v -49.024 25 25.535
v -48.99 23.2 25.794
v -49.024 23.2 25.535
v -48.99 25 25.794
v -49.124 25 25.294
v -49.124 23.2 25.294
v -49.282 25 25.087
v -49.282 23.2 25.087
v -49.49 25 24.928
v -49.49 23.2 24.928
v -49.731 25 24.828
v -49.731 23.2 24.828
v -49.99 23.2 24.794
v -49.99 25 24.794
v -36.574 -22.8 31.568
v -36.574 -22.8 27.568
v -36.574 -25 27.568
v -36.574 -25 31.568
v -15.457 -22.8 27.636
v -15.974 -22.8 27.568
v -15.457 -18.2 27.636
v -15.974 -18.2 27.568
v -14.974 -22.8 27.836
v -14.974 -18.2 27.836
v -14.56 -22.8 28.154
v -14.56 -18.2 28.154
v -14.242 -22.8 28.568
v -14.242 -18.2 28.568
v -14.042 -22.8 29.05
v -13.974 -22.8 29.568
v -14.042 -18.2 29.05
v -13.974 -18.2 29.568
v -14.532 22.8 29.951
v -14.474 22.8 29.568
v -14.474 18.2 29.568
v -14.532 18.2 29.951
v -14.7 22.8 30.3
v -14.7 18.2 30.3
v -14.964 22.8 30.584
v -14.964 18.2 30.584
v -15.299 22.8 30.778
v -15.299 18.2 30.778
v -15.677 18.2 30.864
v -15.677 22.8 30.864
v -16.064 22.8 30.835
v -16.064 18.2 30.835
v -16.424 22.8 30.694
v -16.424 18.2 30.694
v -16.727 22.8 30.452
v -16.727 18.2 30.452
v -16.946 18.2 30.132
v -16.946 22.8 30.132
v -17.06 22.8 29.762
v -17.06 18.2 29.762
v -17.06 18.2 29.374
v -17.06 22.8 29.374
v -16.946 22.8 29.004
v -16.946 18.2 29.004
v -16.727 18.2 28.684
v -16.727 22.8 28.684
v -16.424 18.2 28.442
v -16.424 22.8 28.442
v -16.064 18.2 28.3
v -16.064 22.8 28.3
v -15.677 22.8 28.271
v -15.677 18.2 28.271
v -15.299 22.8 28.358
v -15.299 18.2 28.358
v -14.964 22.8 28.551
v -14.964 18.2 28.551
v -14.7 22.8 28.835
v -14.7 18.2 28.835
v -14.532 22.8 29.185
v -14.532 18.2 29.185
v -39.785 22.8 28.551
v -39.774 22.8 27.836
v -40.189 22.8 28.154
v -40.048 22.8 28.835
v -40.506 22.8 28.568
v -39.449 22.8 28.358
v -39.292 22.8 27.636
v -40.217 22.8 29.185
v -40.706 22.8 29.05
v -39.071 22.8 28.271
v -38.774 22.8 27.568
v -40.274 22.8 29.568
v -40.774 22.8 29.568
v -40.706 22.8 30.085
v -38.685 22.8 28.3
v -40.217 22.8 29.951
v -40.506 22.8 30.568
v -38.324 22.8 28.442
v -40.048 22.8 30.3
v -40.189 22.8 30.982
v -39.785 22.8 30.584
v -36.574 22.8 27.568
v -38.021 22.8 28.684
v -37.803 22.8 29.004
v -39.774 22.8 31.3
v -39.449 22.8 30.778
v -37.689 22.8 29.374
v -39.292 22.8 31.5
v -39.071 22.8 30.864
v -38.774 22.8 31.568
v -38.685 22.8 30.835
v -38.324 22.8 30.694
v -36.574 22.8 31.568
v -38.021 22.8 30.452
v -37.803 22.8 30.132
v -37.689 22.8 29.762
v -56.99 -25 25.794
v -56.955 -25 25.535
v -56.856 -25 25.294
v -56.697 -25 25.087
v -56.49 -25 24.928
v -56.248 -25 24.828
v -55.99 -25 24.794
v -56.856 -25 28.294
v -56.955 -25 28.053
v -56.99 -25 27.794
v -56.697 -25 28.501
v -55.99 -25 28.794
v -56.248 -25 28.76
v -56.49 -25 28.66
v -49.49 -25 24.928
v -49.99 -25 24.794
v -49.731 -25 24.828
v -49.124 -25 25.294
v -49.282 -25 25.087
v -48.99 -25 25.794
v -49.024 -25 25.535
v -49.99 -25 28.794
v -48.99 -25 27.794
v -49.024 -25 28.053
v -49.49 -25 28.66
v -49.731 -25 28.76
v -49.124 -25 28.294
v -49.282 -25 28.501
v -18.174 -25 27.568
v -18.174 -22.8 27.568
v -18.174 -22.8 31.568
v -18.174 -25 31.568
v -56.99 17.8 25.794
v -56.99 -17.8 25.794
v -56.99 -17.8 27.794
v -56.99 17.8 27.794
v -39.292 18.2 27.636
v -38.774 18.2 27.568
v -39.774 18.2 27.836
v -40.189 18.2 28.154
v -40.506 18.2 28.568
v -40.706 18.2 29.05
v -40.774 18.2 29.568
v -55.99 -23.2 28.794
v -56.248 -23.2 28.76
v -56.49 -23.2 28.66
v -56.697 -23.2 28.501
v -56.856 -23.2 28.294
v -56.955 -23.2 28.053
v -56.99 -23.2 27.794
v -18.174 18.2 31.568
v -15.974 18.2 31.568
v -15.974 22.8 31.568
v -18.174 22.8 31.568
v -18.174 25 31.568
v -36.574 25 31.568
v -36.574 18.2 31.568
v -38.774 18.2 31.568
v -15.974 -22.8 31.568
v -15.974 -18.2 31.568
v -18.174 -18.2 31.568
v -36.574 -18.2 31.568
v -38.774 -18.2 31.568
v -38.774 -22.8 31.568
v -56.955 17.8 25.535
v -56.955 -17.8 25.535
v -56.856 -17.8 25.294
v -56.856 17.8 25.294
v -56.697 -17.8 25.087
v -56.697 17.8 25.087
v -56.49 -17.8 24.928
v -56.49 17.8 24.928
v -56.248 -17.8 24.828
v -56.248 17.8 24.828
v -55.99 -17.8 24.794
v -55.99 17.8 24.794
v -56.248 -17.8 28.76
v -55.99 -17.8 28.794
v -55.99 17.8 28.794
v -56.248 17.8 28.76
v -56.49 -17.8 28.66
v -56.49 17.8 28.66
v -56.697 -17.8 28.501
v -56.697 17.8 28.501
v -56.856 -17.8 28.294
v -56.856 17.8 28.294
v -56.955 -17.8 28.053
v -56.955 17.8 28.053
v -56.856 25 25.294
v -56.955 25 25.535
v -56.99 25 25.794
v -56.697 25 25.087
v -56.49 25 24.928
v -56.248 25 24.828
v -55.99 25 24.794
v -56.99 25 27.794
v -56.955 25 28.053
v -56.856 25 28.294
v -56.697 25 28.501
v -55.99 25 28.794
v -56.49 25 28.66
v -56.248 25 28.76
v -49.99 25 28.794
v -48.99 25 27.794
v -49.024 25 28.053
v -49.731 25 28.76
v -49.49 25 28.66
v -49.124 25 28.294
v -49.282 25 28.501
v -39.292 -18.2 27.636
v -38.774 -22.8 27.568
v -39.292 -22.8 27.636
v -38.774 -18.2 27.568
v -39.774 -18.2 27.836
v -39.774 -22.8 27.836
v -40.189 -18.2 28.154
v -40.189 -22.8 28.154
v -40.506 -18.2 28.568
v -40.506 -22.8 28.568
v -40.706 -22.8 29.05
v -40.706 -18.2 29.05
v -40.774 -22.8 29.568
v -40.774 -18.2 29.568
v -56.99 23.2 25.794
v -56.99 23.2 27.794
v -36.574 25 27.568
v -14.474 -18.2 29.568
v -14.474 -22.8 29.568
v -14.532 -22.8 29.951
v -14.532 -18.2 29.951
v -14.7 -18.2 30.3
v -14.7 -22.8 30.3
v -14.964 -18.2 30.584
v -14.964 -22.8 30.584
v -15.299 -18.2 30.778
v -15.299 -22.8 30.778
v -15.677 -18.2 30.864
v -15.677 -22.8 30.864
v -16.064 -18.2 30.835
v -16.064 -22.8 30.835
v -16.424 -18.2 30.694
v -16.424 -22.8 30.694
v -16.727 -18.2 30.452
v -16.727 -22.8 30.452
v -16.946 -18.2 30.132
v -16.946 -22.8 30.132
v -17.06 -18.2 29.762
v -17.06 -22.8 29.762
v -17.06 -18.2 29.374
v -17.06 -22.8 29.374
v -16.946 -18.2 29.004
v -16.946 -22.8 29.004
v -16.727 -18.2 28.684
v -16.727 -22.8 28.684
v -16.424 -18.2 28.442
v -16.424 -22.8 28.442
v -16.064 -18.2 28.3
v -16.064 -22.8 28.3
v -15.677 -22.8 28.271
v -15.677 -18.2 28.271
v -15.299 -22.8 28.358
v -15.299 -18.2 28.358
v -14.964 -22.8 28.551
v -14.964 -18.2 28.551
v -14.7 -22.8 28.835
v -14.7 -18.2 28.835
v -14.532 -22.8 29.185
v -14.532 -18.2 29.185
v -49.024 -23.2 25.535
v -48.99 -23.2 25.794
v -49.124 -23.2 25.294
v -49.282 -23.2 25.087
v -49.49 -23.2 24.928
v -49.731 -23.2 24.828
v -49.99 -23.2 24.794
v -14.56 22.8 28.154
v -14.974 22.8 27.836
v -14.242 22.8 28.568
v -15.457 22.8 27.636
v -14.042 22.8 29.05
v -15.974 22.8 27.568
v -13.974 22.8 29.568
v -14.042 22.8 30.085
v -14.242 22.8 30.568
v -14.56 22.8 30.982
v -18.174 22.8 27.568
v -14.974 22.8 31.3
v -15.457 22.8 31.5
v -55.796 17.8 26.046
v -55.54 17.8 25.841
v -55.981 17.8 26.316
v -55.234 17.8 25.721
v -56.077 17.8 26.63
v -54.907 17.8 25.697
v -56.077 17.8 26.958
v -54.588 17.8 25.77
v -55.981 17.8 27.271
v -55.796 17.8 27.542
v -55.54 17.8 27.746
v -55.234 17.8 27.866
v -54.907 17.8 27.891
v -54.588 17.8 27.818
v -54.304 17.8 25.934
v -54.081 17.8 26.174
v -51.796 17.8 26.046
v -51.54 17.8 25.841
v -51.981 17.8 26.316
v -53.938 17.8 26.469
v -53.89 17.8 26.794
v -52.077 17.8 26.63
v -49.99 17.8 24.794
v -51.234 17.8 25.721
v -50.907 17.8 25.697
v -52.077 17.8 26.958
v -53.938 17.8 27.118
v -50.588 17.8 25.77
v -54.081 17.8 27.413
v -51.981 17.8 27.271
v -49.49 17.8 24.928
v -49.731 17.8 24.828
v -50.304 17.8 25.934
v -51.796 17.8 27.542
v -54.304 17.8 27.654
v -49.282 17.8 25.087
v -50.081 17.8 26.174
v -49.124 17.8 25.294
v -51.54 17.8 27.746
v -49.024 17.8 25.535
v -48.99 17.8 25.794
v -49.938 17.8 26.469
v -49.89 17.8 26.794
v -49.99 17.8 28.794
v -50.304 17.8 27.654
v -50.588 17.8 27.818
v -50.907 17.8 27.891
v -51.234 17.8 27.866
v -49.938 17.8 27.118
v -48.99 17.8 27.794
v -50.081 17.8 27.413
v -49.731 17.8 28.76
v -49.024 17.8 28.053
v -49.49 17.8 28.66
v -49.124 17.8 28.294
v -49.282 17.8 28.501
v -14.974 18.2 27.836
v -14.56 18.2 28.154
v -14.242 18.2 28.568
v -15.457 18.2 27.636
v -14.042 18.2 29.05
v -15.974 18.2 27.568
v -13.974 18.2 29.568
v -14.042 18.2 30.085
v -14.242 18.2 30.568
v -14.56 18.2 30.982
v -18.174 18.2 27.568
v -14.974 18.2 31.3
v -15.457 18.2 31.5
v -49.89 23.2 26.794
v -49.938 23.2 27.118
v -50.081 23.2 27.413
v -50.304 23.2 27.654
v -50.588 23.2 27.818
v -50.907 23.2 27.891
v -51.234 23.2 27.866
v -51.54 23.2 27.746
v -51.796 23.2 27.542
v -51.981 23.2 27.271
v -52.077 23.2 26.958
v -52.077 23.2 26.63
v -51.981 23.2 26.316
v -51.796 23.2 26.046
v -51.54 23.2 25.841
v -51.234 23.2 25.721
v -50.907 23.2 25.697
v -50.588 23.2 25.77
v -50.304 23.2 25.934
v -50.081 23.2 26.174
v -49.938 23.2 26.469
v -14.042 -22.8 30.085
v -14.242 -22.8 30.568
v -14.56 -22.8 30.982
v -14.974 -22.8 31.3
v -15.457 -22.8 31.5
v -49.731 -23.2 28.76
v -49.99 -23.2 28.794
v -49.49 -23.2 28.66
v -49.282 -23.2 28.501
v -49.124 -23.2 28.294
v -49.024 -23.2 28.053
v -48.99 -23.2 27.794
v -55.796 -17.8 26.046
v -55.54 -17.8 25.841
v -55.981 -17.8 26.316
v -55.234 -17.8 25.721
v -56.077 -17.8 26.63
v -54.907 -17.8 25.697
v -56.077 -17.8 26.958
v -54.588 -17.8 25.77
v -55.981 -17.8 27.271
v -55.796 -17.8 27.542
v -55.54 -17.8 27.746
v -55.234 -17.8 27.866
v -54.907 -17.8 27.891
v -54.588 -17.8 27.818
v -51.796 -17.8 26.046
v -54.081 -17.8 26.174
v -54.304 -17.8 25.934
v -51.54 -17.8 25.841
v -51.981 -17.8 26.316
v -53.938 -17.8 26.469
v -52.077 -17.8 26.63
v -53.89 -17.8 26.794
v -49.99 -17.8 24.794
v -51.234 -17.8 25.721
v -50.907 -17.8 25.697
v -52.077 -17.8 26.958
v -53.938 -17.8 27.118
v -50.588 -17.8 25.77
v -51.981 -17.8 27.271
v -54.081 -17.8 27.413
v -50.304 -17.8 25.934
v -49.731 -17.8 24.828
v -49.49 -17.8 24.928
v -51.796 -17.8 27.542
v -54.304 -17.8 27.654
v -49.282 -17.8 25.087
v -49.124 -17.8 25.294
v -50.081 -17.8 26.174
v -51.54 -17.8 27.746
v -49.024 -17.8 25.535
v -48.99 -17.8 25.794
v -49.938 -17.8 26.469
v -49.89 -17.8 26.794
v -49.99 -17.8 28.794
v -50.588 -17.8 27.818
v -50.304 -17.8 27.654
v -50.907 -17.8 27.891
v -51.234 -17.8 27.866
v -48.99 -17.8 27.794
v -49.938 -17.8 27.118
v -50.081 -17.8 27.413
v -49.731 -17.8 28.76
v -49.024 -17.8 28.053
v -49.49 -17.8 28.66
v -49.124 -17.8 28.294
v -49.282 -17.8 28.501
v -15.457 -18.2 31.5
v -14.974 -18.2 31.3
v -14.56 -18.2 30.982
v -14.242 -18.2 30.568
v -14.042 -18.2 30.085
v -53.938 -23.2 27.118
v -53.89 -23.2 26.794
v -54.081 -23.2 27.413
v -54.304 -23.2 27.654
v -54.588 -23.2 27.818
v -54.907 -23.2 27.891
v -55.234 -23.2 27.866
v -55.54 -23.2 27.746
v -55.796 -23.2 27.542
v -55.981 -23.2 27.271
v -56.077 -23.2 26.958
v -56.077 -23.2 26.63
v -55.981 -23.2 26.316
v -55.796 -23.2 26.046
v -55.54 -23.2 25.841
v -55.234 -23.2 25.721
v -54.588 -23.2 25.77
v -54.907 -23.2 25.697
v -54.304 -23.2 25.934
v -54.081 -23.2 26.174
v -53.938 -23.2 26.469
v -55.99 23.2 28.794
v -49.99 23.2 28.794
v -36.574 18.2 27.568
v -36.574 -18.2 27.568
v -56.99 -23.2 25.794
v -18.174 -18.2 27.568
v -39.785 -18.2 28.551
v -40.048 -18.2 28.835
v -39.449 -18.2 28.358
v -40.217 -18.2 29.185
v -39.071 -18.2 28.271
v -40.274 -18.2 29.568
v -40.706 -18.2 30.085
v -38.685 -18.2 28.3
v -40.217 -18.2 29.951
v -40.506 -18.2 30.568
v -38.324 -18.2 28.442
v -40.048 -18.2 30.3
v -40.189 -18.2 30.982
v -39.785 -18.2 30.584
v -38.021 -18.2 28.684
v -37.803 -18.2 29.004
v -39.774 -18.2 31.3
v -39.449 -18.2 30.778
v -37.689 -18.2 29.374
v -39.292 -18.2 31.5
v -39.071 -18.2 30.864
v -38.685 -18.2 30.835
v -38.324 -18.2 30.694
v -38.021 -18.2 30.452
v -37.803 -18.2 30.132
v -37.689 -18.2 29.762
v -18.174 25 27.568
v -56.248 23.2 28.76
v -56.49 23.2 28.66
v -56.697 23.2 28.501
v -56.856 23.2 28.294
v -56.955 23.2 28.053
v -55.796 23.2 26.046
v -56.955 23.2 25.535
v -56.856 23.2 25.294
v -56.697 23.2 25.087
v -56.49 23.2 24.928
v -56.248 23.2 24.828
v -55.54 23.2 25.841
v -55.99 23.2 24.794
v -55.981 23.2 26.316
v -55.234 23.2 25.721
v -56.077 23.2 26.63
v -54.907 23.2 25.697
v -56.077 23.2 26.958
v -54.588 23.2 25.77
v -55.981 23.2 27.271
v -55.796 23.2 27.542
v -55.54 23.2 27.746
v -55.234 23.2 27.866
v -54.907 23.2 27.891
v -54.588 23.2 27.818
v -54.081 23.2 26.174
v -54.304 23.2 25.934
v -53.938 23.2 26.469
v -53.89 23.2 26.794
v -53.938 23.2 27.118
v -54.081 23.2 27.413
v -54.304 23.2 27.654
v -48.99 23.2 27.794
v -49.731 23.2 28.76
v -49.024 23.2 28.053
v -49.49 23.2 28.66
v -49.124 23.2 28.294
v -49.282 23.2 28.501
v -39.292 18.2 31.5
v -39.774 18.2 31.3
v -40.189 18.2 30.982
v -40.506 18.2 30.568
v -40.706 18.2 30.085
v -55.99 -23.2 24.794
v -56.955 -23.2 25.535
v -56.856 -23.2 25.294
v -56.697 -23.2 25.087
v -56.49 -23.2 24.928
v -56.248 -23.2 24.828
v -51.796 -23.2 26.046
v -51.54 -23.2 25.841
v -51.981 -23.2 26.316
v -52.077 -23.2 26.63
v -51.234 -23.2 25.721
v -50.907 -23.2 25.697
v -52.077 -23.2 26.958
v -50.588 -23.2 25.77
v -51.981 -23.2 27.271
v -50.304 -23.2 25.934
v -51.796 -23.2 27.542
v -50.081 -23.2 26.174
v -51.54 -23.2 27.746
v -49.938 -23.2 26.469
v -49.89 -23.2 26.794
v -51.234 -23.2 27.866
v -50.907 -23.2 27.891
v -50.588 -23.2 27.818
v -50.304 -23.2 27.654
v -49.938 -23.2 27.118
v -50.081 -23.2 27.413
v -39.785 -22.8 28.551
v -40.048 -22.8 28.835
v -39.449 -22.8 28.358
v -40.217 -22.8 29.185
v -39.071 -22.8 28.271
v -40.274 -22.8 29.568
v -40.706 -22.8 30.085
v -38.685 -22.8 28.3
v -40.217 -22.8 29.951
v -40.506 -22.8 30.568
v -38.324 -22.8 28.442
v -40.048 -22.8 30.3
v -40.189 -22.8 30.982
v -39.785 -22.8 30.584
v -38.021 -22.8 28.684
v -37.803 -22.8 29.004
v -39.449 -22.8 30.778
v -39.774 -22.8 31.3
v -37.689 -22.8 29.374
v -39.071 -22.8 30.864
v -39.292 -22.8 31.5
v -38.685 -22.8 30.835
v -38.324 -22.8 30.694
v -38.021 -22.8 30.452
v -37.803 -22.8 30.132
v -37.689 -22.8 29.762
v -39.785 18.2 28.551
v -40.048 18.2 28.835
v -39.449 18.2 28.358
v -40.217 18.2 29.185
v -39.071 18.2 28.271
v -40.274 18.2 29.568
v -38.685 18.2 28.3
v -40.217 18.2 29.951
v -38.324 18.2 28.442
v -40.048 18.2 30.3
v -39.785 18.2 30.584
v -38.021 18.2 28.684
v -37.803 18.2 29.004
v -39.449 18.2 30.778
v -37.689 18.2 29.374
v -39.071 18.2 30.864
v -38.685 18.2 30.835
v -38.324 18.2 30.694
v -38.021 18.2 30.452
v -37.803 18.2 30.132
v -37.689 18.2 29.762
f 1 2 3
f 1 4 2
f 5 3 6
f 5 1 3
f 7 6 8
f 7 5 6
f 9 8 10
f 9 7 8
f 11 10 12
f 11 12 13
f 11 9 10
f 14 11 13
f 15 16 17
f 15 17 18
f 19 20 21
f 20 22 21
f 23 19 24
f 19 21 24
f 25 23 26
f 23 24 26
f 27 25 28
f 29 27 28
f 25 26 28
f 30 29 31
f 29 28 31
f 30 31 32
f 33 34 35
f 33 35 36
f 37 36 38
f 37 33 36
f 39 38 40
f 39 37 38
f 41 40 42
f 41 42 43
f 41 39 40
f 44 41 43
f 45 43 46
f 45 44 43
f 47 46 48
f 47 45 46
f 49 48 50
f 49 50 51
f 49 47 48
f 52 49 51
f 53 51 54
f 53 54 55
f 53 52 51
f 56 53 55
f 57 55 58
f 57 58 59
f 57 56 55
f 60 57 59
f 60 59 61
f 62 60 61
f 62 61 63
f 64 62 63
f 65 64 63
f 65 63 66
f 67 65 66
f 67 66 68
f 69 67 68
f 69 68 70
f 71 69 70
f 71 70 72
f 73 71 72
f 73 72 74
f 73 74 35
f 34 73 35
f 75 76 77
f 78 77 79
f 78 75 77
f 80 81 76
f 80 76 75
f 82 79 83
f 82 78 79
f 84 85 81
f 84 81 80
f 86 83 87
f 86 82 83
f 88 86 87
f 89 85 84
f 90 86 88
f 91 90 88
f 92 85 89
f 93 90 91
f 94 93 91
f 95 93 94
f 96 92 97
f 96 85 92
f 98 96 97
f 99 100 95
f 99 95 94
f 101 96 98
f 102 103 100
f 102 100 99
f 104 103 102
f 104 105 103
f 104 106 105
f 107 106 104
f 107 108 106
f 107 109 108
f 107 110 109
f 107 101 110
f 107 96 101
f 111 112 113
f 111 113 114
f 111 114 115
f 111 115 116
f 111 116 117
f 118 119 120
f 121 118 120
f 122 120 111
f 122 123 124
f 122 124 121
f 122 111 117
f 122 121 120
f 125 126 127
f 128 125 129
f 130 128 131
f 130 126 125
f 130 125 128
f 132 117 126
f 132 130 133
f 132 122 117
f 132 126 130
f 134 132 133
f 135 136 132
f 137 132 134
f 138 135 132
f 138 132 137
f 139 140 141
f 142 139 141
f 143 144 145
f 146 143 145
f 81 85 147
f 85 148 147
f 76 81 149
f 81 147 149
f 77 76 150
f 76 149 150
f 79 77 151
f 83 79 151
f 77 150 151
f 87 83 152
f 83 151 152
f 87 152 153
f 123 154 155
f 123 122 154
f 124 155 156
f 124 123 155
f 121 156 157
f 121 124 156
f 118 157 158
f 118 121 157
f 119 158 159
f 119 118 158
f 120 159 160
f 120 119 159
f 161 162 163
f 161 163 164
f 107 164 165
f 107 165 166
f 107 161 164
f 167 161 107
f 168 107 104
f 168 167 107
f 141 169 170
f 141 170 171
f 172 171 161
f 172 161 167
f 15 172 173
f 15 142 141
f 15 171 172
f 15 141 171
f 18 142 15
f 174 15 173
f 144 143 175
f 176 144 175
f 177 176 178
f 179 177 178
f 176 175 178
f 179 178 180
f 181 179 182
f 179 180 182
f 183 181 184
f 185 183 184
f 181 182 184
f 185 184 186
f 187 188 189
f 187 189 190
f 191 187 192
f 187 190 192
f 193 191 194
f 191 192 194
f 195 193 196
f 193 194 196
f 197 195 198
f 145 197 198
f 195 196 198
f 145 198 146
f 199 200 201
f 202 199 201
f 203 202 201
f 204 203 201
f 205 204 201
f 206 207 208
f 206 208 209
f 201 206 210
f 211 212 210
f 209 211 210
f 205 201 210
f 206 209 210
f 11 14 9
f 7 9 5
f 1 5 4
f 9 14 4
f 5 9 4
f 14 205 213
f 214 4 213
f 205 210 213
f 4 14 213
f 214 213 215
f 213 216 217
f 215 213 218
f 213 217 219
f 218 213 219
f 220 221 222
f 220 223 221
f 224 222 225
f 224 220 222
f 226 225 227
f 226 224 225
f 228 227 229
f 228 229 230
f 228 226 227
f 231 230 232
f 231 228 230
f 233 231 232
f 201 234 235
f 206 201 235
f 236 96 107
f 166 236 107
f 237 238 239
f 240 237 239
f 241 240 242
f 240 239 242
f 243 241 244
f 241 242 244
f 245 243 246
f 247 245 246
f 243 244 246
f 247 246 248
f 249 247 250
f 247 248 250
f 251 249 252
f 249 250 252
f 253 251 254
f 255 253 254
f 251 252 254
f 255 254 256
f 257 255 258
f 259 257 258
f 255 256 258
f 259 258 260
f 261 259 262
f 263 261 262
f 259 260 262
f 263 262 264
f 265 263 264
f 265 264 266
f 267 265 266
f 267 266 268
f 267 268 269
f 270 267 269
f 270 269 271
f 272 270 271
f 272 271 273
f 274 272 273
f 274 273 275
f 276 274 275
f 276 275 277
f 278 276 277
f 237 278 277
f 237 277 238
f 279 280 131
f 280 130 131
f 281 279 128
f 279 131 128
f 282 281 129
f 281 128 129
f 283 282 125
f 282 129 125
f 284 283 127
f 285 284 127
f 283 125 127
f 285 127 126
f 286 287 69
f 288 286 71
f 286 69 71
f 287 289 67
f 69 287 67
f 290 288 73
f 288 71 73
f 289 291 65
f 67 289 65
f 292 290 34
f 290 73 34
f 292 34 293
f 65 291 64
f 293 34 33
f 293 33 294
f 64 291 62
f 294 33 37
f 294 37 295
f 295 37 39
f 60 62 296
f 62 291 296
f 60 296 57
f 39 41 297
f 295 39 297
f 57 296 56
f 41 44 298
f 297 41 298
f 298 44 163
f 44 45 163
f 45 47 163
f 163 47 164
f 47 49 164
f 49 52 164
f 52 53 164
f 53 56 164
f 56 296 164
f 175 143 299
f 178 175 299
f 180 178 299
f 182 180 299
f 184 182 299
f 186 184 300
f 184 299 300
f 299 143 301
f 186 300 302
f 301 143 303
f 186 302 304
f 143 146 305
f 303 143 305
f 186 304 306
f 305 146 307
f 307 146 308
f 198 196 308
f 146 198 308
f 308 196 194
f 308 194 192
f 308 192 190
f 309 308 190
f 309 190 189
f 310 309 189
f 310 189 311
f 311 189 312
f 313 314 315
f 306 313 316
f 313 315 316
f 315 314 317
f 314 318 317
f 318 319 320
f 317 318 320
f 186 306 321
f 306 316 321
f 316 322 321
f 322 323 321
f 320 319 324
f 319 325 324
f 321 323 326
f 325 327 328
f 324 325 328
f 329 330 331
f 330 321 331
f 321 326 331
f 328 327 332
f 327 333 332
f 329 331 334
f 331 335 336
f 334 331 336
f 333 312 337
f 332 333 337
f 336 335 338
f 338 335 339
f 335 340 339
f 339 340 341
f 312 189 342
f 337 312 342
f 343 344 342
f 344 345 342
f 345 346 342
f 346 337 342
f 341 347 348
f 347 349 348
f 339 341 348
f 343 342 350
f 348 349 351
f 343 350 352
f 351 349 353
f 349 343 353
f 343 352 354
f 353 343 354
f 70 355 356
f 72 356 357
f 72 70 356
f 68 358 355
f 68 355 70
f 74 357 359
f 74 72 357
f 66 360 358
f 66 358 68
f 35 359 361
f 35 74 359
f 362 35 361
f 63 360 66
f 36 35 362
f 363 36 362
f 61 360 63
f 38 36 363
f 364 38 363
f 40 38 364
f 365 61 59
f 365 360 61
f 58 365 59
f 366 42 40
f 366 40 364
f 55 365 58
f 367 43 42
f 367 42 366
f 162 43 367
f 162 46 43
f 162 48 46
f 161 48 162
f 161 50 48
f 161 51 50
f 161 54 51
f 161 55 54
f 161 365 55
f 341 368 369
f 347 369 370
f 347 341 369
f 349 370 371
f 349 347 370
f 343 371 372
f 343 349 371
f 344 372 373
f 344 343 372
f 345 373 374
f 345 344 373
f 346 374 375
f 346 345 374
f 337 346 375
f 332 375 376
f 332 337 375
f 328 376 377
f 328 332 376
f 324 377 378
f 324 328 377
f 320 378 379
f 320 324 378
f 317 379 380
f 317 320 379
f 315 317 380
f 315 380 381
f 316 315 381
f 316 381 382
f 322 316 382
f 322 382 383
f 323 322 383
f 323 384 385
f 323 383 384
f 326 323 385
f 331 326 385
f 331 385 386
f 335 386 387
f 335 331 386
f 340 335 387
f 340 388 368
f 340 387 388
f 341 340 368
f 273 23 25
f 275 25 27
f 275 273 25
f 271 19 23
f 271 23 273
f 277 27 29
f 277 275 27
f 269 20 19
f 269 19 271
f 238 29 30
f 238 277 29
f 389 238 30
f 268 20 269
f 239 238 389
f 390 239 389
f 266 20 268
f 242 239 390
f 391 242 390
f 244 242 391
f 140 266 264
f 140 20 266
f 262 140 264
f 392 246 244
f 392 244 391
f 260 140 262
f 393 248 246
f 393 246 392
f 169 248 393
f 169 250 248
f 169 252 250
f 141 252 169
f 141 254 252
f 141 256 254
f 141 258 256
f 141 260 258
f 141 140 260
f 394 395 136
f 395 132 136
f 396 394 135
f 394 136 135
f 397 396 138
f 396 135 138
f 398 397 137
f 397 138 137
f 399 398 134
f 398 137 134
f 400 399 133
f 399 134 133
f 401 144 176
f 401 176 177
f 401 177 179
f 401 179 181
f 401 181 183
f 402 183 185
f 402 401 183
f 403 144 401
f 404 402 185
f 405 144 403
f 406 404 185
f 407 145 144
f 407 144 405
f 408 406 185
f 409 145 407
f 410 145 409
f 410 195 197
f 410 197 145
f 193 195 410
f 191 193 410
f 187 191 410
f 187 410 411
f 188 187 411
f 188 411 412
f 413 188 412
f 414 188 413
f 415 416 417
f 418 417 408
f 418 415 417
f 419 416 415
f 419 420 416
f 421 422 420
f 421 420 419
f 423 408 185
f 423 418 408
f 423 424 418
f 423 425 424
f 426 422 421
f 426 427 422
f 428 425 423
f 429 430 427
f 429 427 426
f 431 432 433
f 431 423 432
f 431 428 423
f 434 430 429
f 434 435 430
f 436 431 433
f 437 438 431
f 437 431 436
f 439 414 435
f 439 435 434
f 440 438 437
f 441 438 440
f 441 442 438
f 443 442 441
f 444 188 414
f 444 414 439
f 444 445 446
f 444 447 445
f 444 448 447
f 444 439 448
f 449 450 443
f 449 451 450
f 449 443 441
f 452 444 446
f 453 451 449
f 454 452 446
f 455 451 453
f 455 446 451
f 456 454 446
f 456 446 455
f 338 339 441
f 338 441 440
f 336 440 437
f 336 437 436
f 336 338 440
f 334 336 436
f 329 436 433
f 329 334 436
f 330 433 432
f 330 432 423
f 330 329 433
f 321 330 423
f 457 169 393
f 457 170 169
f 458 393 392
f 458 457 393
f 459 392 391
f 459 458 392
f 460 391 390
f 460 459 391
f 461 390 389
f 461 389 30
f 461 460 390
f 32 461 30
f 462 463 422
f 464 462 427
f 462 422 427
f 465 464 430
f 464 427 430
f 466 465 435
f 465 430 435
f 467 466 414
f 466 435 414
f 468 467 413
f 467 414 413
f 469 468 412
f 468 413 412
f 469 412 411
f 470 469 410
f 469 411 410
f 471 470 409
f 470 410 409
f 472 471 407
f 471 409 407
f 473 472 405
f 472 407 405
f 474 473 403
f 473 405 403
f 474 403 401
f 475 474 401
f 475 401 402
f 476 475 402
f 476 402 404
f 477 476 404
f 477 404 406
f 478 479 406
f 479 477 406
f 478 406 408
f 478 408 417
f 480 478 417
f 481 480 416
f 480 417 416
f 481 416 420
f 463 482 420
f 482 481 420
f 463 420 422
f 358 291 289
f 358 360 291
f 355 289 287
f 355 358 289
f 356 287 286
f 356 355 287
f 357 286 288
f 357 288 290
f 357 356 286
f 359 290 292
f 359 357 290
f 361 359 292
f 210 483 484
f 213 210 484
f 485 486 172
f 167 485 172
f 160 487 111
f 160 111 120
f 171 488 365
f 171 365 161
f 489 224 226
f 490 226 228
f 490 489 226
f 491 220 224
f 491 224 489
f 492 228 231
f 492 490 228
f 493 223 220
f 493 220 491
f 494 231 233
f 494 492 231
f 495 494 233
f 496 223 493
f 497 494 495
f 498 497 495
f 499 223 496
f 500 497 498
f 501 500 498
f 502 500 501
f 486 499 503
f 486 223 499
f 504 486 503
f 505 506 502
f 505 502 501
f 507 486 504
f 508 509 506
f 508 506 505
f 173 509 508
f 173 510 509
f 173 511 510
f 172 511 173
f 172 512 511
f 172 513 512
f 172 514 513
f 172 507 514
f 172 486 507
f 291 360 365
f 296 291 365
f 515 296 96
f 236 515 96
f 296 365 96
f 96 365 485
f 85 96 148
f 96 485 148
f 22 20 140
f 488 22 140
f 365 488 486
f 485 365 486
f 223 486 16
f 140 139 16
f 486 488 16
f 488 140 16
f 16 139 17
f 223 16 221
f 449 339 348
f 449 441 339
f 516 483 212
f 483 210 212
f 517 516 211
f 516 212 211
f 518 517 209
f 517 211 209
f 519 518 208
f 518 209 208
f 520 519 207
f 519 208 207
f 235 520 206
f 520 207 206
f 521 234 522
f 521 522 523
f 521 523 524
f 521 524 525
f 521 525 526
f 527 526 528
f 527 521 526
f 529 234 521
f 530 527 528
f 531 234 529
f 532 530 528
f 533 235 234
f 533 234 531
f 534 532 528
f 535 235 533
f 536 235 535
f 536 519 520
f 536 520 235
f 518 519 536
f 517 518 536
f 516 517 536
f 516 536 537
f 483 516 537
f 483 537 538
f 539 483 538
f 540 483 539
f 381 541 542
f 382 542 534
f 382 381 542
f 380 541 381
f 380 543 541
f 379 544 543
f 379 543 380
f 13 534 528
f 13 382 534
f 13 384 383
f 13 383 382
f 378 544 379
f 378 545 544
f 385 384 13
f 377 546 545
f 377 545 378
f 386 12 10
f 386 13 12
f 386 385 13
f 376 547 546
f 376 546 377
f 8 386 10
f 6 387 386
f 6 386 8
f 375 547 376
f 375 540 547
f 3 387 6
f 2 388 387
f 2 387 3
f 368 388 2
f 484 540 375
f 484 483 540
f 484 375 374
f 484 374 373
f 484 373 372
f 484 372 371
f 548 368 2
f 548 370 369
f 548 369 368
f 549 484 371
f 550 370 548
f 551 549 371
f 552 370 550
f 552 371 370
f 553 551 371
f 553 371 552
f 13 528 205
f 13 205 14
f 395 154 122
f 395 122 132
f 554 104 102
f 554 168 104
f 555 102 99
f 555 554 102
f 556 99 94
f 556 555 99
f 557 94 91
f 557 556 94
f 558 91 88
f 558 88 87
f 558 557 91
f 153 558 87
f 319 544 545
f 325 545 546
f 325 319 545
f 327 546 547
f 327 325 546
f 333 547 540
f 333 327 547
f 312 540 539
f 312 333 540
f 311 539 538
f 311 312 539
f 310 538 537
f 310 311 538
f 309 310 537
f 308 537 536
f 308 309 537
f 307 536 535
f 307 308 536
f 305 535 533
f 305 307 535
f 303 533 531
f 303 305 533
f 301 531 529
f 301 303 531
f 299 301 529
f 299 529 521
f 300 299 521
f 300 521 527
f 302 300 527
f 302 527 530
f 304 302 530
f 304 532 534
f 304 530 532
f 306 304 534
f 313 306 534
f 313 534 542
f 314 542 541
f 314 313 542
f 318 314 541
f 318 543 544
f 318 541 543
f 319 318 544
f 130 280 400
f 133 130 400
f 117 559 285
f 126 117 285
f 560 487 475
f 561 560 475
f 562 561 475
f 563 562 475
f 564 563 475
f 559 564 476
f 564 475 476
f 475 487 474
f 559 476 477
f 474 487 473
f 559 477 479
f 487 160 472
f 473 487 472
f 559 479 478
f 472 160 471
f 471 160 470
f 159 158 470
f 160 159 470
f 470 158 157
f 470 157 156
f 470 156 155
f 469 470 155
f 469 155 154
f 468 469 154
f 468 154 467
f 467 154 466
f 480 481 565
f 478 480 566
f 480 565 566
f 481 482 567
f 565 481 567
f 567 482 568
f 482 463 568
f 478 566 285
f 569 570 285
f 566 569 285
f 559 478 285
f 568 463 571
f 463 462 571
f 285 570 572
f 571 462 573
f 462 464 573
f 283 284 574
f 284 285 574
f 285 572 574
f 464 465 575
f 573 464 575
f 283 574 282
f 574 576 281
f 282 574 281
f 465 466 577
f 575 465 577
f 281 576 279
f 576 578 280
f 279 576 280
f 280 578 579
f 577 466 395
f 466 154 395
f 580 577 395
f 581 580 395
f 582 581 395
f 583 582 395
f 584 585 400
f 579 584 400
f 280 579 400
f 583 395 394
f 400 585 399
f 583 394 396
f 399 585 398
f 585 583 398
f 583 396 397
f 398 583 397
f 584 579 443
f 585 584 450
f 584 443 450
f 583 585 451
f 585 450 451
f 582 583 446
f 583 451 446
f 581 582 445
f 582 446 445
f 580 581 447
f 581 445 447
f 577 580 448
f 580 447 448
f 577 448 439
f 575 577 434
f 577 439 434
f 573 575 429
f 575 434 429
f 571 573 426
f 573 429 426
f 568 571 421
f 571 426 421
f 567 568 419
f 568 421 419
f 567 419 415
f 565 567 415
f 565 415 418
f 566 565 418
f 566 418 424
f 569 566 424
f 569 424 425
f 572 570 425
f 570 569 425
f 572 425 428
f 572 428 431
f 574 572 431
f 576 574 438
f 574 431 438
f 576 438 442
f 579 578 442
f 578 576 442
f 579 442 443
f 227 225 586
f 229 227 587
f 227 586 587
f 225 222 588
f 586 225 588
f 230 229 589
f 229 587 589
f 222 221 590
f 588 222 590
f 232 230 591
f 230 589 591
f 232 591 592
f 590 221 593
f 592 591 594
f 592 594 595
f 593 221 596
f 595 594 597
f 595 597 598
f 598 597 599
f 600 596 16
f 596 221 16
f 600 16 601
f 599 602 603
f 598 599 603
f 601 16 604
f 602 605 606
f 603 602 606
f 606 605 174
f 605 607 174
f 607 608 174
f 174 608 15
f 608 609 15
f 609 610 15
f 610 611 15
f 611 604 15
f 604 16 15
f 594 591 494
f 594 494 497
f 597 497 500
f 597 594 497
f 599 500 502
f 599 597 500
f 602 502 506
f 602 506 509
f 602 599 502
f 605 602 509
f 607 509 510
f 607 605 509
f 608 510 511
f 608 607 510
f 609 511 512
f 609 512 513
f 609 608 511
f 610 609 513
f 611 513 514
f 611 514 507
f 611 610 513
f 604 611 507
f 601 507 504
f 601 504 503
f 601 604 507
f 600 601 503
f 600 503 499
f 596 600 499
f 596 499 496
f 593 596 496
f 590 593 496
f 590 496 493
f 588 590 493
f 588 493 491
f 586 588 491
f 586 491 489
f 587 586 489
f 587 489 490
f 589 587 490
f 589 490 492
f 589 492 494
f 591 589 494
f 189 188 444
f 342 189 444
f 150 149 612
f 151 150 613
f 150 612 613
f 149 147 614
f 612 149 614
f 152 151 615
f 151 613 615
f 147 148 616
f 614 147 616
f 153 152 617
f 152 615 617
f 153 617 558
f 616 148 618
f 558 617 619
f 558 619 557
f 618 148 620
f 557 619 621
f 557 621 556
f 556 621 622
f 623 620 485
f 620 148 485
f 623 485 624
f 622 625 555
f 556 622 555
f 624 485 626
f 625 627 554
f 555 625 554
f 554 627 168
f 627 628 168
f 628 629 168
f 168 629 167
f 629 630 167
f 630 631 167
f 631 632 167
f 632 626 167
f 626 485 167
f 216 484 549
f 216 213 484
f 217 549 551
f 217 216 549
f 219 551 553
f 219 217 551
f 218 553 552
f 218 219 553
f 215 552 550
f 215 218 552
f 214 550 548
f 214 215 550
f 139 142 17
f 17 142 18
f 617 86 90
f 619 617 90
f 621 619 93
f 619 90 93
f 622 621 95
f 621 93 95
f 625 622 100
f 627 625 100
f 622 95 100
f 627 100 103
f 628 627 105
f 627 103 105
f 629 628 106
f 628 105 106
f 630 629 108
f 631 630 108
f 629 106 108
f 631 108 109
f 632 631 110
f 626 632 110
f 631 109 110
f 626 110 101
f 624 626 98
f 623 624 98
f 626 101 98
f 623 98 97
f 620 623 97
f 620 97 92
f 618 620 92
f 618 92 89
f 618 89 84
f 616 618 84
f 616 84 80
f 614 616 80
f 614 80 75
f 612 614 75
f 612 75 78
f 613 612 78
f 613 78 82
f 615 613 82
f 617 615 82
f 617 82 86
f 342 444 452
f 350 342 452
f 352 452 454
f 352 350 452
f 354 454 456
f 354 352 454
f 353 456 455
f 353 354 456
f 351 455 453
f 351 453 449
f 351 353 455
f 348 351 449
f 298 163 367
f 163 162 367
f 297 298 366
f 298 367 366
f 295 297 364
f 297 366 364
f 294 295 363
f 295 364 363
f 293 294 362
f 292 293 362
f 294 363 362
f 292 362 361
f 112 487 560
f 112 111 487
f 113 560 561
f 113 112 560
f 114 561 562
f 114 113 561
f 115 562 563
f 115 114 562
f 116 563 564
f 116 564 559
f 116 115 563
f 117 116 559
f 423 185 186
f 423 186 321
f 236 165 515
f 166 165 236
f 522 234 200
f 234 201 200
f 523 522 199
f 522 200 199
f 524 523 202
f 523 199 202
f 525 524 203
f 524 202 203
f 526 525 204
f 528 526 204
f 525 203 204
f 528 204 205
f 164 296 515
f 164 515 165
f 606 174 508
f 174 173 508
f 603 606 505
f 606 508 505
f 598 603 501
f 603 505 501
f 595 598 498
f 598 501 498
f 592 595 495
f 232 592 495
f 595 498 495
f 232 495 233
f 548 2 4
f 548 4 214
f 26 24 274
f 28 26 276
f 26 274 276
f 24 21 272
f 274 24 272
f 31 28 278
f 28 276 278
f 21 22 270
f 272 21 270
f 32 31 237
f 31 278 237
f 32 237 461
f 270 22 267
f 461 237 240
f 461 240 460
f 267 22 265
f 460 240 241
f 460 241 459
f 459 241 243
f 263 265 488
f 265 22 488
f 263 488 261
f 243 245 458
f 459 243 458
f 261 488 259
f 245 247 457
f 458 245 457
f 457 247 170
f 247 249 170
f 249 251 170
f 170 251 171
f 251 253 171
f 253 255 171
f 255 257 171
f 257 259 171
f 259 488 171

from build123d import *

# Parameters (mm, degrees)
F0_W      = 8
F0_H      = 4
F1_DEPTH  = 25
F2_W      = 8
F2_H      = 5.4
F3_DEPTH  = 25
F4_R      = 1.1
F5_DEPTH  = 7
F6_R      = 1
F8_W      = 9.2
F8_H      = 4
F9_DEPTH  = 25
F10_W     = 4.6
F10_H     = 4
F11_DEPTH = 4.2
F12_R     = 1.3
F13_DEPTH = 25
F14_R     = 1.99999


# Not quite as in the source:
# - a fillet or chamfer is up to 0.001 mm smaller than in the source, because OpenCascade refuses the exact size


with BuildPart() as f1:
    # F0 (on Front) → F1 (new body)
    with BuildSketch(Plane.XZ):
        with Locations((-52.9895666987, 26.7937131725)):
            Rectangle(F0_W, F0_H)
    extrude(amount=F1_DEPTH)

    # F2 (on face) → F3 (cut)
    with BuildSketch(Plane.XY.offset(28.7937131725)):
        with Locations((-52.9895666987, -20.5)):
            Rectangle(F2_W, F2_H)
    extrude(amount=-F3_DEPTH, mode=Mode.SUBTRACT)

    # F4 (on face) → F5 (join)
    with BuildSketch(Plane.XZ.offset(17.8)):
        with Locations((-54.9895666987, 26.7937131725)):
            Circle(F4_R)
        with Locations((-50.9895666987, 26.7937131725)):
            Circle(F4_R)
    extrude(amount=F5_DEPTH)

    # F6
    f6_edges = [f1.edges().sort_by_distance(p)[0] for p in [
        (-56.989567, -8.9, 28.793713),
        (-48.989567, -8.9, 28.793713),
        (-48.989567, -8.9, 24.793713),
        (-48.989567, -24.1, 28.793713),
        (-56.989567, -24.1, 28.793713),
        (-48.989567, -24.1, 24.793713),
        (-56.989567, -8.9, 24.793713),
        (-56.989567, -24.1, 24.793713),
    ]]
    fillet(f6_edges, radius=F6_R)

    # F7: F1 across plane


with BuildPart() as f1_1:
    add(f1.part)
    add(f1.part.mirror(Plane.XZ))


with BuildPart() as f9:
    # F8 (on Front) → F9 (new body)
    with BuildSketch(Plane.XZ):
        with Locations((-22.7743378759, 29.5677930117)):
            Rectangle(F8_W, F8_H)
    extrude(amount=F9_DEPTH)

    # F10 (on face) → F11 (join)
    with BuildSketch(Plane.YZ.offset(-18.1743378759)):
        with Locations((-20.5, 29.5677930117)):
            Rectangle(F10_W, F10_H)
    extrude(amount=F11_DEPTH)

    # F12 (on face) → F13 (cut)
    with BuildSketch(Plane.XZ.offset(22.8)):
        with Locations((-15.7743378759, 29.5677930117)):
            Circle(F12_R)
    extrude(amount=-F13_DEPTH, mode=Mode.SUBTRACT)

    # F14 (radius 2 in the source; OpenCascade refuses exactly that, so slightly less here)
    f14_edges = [f9.edges().sort_by_distance(p)[0] for p in [
        (-13.974338, -20.5, 31.567793),
        (-13.974338, -20.5, 27.567793),
    ]]
    fillet(f14_edges, radius=F14_R)

    # F15: F9 across face


with BuildPart() as f9_1:
    add(f9.part)
    add(f9.part.mirror(Plane(origin=(-27.3743378759, -12.5, 29.5677930117), x_dir=(0, -1, 0), z_dir=(-1, 0, 0))))

    # F16: F9 across face


with BuildPart() as f9_2:
    add(f9_1.part)
    add(f9_1.part.mirror(Plane(origin=(-27.3743378759, 0, 29.5677930117), x_dir=(-1, 0, 0), z_dir=(0, 1, 0))))


solid = Compound([f1_1.part, f9_2.part])
